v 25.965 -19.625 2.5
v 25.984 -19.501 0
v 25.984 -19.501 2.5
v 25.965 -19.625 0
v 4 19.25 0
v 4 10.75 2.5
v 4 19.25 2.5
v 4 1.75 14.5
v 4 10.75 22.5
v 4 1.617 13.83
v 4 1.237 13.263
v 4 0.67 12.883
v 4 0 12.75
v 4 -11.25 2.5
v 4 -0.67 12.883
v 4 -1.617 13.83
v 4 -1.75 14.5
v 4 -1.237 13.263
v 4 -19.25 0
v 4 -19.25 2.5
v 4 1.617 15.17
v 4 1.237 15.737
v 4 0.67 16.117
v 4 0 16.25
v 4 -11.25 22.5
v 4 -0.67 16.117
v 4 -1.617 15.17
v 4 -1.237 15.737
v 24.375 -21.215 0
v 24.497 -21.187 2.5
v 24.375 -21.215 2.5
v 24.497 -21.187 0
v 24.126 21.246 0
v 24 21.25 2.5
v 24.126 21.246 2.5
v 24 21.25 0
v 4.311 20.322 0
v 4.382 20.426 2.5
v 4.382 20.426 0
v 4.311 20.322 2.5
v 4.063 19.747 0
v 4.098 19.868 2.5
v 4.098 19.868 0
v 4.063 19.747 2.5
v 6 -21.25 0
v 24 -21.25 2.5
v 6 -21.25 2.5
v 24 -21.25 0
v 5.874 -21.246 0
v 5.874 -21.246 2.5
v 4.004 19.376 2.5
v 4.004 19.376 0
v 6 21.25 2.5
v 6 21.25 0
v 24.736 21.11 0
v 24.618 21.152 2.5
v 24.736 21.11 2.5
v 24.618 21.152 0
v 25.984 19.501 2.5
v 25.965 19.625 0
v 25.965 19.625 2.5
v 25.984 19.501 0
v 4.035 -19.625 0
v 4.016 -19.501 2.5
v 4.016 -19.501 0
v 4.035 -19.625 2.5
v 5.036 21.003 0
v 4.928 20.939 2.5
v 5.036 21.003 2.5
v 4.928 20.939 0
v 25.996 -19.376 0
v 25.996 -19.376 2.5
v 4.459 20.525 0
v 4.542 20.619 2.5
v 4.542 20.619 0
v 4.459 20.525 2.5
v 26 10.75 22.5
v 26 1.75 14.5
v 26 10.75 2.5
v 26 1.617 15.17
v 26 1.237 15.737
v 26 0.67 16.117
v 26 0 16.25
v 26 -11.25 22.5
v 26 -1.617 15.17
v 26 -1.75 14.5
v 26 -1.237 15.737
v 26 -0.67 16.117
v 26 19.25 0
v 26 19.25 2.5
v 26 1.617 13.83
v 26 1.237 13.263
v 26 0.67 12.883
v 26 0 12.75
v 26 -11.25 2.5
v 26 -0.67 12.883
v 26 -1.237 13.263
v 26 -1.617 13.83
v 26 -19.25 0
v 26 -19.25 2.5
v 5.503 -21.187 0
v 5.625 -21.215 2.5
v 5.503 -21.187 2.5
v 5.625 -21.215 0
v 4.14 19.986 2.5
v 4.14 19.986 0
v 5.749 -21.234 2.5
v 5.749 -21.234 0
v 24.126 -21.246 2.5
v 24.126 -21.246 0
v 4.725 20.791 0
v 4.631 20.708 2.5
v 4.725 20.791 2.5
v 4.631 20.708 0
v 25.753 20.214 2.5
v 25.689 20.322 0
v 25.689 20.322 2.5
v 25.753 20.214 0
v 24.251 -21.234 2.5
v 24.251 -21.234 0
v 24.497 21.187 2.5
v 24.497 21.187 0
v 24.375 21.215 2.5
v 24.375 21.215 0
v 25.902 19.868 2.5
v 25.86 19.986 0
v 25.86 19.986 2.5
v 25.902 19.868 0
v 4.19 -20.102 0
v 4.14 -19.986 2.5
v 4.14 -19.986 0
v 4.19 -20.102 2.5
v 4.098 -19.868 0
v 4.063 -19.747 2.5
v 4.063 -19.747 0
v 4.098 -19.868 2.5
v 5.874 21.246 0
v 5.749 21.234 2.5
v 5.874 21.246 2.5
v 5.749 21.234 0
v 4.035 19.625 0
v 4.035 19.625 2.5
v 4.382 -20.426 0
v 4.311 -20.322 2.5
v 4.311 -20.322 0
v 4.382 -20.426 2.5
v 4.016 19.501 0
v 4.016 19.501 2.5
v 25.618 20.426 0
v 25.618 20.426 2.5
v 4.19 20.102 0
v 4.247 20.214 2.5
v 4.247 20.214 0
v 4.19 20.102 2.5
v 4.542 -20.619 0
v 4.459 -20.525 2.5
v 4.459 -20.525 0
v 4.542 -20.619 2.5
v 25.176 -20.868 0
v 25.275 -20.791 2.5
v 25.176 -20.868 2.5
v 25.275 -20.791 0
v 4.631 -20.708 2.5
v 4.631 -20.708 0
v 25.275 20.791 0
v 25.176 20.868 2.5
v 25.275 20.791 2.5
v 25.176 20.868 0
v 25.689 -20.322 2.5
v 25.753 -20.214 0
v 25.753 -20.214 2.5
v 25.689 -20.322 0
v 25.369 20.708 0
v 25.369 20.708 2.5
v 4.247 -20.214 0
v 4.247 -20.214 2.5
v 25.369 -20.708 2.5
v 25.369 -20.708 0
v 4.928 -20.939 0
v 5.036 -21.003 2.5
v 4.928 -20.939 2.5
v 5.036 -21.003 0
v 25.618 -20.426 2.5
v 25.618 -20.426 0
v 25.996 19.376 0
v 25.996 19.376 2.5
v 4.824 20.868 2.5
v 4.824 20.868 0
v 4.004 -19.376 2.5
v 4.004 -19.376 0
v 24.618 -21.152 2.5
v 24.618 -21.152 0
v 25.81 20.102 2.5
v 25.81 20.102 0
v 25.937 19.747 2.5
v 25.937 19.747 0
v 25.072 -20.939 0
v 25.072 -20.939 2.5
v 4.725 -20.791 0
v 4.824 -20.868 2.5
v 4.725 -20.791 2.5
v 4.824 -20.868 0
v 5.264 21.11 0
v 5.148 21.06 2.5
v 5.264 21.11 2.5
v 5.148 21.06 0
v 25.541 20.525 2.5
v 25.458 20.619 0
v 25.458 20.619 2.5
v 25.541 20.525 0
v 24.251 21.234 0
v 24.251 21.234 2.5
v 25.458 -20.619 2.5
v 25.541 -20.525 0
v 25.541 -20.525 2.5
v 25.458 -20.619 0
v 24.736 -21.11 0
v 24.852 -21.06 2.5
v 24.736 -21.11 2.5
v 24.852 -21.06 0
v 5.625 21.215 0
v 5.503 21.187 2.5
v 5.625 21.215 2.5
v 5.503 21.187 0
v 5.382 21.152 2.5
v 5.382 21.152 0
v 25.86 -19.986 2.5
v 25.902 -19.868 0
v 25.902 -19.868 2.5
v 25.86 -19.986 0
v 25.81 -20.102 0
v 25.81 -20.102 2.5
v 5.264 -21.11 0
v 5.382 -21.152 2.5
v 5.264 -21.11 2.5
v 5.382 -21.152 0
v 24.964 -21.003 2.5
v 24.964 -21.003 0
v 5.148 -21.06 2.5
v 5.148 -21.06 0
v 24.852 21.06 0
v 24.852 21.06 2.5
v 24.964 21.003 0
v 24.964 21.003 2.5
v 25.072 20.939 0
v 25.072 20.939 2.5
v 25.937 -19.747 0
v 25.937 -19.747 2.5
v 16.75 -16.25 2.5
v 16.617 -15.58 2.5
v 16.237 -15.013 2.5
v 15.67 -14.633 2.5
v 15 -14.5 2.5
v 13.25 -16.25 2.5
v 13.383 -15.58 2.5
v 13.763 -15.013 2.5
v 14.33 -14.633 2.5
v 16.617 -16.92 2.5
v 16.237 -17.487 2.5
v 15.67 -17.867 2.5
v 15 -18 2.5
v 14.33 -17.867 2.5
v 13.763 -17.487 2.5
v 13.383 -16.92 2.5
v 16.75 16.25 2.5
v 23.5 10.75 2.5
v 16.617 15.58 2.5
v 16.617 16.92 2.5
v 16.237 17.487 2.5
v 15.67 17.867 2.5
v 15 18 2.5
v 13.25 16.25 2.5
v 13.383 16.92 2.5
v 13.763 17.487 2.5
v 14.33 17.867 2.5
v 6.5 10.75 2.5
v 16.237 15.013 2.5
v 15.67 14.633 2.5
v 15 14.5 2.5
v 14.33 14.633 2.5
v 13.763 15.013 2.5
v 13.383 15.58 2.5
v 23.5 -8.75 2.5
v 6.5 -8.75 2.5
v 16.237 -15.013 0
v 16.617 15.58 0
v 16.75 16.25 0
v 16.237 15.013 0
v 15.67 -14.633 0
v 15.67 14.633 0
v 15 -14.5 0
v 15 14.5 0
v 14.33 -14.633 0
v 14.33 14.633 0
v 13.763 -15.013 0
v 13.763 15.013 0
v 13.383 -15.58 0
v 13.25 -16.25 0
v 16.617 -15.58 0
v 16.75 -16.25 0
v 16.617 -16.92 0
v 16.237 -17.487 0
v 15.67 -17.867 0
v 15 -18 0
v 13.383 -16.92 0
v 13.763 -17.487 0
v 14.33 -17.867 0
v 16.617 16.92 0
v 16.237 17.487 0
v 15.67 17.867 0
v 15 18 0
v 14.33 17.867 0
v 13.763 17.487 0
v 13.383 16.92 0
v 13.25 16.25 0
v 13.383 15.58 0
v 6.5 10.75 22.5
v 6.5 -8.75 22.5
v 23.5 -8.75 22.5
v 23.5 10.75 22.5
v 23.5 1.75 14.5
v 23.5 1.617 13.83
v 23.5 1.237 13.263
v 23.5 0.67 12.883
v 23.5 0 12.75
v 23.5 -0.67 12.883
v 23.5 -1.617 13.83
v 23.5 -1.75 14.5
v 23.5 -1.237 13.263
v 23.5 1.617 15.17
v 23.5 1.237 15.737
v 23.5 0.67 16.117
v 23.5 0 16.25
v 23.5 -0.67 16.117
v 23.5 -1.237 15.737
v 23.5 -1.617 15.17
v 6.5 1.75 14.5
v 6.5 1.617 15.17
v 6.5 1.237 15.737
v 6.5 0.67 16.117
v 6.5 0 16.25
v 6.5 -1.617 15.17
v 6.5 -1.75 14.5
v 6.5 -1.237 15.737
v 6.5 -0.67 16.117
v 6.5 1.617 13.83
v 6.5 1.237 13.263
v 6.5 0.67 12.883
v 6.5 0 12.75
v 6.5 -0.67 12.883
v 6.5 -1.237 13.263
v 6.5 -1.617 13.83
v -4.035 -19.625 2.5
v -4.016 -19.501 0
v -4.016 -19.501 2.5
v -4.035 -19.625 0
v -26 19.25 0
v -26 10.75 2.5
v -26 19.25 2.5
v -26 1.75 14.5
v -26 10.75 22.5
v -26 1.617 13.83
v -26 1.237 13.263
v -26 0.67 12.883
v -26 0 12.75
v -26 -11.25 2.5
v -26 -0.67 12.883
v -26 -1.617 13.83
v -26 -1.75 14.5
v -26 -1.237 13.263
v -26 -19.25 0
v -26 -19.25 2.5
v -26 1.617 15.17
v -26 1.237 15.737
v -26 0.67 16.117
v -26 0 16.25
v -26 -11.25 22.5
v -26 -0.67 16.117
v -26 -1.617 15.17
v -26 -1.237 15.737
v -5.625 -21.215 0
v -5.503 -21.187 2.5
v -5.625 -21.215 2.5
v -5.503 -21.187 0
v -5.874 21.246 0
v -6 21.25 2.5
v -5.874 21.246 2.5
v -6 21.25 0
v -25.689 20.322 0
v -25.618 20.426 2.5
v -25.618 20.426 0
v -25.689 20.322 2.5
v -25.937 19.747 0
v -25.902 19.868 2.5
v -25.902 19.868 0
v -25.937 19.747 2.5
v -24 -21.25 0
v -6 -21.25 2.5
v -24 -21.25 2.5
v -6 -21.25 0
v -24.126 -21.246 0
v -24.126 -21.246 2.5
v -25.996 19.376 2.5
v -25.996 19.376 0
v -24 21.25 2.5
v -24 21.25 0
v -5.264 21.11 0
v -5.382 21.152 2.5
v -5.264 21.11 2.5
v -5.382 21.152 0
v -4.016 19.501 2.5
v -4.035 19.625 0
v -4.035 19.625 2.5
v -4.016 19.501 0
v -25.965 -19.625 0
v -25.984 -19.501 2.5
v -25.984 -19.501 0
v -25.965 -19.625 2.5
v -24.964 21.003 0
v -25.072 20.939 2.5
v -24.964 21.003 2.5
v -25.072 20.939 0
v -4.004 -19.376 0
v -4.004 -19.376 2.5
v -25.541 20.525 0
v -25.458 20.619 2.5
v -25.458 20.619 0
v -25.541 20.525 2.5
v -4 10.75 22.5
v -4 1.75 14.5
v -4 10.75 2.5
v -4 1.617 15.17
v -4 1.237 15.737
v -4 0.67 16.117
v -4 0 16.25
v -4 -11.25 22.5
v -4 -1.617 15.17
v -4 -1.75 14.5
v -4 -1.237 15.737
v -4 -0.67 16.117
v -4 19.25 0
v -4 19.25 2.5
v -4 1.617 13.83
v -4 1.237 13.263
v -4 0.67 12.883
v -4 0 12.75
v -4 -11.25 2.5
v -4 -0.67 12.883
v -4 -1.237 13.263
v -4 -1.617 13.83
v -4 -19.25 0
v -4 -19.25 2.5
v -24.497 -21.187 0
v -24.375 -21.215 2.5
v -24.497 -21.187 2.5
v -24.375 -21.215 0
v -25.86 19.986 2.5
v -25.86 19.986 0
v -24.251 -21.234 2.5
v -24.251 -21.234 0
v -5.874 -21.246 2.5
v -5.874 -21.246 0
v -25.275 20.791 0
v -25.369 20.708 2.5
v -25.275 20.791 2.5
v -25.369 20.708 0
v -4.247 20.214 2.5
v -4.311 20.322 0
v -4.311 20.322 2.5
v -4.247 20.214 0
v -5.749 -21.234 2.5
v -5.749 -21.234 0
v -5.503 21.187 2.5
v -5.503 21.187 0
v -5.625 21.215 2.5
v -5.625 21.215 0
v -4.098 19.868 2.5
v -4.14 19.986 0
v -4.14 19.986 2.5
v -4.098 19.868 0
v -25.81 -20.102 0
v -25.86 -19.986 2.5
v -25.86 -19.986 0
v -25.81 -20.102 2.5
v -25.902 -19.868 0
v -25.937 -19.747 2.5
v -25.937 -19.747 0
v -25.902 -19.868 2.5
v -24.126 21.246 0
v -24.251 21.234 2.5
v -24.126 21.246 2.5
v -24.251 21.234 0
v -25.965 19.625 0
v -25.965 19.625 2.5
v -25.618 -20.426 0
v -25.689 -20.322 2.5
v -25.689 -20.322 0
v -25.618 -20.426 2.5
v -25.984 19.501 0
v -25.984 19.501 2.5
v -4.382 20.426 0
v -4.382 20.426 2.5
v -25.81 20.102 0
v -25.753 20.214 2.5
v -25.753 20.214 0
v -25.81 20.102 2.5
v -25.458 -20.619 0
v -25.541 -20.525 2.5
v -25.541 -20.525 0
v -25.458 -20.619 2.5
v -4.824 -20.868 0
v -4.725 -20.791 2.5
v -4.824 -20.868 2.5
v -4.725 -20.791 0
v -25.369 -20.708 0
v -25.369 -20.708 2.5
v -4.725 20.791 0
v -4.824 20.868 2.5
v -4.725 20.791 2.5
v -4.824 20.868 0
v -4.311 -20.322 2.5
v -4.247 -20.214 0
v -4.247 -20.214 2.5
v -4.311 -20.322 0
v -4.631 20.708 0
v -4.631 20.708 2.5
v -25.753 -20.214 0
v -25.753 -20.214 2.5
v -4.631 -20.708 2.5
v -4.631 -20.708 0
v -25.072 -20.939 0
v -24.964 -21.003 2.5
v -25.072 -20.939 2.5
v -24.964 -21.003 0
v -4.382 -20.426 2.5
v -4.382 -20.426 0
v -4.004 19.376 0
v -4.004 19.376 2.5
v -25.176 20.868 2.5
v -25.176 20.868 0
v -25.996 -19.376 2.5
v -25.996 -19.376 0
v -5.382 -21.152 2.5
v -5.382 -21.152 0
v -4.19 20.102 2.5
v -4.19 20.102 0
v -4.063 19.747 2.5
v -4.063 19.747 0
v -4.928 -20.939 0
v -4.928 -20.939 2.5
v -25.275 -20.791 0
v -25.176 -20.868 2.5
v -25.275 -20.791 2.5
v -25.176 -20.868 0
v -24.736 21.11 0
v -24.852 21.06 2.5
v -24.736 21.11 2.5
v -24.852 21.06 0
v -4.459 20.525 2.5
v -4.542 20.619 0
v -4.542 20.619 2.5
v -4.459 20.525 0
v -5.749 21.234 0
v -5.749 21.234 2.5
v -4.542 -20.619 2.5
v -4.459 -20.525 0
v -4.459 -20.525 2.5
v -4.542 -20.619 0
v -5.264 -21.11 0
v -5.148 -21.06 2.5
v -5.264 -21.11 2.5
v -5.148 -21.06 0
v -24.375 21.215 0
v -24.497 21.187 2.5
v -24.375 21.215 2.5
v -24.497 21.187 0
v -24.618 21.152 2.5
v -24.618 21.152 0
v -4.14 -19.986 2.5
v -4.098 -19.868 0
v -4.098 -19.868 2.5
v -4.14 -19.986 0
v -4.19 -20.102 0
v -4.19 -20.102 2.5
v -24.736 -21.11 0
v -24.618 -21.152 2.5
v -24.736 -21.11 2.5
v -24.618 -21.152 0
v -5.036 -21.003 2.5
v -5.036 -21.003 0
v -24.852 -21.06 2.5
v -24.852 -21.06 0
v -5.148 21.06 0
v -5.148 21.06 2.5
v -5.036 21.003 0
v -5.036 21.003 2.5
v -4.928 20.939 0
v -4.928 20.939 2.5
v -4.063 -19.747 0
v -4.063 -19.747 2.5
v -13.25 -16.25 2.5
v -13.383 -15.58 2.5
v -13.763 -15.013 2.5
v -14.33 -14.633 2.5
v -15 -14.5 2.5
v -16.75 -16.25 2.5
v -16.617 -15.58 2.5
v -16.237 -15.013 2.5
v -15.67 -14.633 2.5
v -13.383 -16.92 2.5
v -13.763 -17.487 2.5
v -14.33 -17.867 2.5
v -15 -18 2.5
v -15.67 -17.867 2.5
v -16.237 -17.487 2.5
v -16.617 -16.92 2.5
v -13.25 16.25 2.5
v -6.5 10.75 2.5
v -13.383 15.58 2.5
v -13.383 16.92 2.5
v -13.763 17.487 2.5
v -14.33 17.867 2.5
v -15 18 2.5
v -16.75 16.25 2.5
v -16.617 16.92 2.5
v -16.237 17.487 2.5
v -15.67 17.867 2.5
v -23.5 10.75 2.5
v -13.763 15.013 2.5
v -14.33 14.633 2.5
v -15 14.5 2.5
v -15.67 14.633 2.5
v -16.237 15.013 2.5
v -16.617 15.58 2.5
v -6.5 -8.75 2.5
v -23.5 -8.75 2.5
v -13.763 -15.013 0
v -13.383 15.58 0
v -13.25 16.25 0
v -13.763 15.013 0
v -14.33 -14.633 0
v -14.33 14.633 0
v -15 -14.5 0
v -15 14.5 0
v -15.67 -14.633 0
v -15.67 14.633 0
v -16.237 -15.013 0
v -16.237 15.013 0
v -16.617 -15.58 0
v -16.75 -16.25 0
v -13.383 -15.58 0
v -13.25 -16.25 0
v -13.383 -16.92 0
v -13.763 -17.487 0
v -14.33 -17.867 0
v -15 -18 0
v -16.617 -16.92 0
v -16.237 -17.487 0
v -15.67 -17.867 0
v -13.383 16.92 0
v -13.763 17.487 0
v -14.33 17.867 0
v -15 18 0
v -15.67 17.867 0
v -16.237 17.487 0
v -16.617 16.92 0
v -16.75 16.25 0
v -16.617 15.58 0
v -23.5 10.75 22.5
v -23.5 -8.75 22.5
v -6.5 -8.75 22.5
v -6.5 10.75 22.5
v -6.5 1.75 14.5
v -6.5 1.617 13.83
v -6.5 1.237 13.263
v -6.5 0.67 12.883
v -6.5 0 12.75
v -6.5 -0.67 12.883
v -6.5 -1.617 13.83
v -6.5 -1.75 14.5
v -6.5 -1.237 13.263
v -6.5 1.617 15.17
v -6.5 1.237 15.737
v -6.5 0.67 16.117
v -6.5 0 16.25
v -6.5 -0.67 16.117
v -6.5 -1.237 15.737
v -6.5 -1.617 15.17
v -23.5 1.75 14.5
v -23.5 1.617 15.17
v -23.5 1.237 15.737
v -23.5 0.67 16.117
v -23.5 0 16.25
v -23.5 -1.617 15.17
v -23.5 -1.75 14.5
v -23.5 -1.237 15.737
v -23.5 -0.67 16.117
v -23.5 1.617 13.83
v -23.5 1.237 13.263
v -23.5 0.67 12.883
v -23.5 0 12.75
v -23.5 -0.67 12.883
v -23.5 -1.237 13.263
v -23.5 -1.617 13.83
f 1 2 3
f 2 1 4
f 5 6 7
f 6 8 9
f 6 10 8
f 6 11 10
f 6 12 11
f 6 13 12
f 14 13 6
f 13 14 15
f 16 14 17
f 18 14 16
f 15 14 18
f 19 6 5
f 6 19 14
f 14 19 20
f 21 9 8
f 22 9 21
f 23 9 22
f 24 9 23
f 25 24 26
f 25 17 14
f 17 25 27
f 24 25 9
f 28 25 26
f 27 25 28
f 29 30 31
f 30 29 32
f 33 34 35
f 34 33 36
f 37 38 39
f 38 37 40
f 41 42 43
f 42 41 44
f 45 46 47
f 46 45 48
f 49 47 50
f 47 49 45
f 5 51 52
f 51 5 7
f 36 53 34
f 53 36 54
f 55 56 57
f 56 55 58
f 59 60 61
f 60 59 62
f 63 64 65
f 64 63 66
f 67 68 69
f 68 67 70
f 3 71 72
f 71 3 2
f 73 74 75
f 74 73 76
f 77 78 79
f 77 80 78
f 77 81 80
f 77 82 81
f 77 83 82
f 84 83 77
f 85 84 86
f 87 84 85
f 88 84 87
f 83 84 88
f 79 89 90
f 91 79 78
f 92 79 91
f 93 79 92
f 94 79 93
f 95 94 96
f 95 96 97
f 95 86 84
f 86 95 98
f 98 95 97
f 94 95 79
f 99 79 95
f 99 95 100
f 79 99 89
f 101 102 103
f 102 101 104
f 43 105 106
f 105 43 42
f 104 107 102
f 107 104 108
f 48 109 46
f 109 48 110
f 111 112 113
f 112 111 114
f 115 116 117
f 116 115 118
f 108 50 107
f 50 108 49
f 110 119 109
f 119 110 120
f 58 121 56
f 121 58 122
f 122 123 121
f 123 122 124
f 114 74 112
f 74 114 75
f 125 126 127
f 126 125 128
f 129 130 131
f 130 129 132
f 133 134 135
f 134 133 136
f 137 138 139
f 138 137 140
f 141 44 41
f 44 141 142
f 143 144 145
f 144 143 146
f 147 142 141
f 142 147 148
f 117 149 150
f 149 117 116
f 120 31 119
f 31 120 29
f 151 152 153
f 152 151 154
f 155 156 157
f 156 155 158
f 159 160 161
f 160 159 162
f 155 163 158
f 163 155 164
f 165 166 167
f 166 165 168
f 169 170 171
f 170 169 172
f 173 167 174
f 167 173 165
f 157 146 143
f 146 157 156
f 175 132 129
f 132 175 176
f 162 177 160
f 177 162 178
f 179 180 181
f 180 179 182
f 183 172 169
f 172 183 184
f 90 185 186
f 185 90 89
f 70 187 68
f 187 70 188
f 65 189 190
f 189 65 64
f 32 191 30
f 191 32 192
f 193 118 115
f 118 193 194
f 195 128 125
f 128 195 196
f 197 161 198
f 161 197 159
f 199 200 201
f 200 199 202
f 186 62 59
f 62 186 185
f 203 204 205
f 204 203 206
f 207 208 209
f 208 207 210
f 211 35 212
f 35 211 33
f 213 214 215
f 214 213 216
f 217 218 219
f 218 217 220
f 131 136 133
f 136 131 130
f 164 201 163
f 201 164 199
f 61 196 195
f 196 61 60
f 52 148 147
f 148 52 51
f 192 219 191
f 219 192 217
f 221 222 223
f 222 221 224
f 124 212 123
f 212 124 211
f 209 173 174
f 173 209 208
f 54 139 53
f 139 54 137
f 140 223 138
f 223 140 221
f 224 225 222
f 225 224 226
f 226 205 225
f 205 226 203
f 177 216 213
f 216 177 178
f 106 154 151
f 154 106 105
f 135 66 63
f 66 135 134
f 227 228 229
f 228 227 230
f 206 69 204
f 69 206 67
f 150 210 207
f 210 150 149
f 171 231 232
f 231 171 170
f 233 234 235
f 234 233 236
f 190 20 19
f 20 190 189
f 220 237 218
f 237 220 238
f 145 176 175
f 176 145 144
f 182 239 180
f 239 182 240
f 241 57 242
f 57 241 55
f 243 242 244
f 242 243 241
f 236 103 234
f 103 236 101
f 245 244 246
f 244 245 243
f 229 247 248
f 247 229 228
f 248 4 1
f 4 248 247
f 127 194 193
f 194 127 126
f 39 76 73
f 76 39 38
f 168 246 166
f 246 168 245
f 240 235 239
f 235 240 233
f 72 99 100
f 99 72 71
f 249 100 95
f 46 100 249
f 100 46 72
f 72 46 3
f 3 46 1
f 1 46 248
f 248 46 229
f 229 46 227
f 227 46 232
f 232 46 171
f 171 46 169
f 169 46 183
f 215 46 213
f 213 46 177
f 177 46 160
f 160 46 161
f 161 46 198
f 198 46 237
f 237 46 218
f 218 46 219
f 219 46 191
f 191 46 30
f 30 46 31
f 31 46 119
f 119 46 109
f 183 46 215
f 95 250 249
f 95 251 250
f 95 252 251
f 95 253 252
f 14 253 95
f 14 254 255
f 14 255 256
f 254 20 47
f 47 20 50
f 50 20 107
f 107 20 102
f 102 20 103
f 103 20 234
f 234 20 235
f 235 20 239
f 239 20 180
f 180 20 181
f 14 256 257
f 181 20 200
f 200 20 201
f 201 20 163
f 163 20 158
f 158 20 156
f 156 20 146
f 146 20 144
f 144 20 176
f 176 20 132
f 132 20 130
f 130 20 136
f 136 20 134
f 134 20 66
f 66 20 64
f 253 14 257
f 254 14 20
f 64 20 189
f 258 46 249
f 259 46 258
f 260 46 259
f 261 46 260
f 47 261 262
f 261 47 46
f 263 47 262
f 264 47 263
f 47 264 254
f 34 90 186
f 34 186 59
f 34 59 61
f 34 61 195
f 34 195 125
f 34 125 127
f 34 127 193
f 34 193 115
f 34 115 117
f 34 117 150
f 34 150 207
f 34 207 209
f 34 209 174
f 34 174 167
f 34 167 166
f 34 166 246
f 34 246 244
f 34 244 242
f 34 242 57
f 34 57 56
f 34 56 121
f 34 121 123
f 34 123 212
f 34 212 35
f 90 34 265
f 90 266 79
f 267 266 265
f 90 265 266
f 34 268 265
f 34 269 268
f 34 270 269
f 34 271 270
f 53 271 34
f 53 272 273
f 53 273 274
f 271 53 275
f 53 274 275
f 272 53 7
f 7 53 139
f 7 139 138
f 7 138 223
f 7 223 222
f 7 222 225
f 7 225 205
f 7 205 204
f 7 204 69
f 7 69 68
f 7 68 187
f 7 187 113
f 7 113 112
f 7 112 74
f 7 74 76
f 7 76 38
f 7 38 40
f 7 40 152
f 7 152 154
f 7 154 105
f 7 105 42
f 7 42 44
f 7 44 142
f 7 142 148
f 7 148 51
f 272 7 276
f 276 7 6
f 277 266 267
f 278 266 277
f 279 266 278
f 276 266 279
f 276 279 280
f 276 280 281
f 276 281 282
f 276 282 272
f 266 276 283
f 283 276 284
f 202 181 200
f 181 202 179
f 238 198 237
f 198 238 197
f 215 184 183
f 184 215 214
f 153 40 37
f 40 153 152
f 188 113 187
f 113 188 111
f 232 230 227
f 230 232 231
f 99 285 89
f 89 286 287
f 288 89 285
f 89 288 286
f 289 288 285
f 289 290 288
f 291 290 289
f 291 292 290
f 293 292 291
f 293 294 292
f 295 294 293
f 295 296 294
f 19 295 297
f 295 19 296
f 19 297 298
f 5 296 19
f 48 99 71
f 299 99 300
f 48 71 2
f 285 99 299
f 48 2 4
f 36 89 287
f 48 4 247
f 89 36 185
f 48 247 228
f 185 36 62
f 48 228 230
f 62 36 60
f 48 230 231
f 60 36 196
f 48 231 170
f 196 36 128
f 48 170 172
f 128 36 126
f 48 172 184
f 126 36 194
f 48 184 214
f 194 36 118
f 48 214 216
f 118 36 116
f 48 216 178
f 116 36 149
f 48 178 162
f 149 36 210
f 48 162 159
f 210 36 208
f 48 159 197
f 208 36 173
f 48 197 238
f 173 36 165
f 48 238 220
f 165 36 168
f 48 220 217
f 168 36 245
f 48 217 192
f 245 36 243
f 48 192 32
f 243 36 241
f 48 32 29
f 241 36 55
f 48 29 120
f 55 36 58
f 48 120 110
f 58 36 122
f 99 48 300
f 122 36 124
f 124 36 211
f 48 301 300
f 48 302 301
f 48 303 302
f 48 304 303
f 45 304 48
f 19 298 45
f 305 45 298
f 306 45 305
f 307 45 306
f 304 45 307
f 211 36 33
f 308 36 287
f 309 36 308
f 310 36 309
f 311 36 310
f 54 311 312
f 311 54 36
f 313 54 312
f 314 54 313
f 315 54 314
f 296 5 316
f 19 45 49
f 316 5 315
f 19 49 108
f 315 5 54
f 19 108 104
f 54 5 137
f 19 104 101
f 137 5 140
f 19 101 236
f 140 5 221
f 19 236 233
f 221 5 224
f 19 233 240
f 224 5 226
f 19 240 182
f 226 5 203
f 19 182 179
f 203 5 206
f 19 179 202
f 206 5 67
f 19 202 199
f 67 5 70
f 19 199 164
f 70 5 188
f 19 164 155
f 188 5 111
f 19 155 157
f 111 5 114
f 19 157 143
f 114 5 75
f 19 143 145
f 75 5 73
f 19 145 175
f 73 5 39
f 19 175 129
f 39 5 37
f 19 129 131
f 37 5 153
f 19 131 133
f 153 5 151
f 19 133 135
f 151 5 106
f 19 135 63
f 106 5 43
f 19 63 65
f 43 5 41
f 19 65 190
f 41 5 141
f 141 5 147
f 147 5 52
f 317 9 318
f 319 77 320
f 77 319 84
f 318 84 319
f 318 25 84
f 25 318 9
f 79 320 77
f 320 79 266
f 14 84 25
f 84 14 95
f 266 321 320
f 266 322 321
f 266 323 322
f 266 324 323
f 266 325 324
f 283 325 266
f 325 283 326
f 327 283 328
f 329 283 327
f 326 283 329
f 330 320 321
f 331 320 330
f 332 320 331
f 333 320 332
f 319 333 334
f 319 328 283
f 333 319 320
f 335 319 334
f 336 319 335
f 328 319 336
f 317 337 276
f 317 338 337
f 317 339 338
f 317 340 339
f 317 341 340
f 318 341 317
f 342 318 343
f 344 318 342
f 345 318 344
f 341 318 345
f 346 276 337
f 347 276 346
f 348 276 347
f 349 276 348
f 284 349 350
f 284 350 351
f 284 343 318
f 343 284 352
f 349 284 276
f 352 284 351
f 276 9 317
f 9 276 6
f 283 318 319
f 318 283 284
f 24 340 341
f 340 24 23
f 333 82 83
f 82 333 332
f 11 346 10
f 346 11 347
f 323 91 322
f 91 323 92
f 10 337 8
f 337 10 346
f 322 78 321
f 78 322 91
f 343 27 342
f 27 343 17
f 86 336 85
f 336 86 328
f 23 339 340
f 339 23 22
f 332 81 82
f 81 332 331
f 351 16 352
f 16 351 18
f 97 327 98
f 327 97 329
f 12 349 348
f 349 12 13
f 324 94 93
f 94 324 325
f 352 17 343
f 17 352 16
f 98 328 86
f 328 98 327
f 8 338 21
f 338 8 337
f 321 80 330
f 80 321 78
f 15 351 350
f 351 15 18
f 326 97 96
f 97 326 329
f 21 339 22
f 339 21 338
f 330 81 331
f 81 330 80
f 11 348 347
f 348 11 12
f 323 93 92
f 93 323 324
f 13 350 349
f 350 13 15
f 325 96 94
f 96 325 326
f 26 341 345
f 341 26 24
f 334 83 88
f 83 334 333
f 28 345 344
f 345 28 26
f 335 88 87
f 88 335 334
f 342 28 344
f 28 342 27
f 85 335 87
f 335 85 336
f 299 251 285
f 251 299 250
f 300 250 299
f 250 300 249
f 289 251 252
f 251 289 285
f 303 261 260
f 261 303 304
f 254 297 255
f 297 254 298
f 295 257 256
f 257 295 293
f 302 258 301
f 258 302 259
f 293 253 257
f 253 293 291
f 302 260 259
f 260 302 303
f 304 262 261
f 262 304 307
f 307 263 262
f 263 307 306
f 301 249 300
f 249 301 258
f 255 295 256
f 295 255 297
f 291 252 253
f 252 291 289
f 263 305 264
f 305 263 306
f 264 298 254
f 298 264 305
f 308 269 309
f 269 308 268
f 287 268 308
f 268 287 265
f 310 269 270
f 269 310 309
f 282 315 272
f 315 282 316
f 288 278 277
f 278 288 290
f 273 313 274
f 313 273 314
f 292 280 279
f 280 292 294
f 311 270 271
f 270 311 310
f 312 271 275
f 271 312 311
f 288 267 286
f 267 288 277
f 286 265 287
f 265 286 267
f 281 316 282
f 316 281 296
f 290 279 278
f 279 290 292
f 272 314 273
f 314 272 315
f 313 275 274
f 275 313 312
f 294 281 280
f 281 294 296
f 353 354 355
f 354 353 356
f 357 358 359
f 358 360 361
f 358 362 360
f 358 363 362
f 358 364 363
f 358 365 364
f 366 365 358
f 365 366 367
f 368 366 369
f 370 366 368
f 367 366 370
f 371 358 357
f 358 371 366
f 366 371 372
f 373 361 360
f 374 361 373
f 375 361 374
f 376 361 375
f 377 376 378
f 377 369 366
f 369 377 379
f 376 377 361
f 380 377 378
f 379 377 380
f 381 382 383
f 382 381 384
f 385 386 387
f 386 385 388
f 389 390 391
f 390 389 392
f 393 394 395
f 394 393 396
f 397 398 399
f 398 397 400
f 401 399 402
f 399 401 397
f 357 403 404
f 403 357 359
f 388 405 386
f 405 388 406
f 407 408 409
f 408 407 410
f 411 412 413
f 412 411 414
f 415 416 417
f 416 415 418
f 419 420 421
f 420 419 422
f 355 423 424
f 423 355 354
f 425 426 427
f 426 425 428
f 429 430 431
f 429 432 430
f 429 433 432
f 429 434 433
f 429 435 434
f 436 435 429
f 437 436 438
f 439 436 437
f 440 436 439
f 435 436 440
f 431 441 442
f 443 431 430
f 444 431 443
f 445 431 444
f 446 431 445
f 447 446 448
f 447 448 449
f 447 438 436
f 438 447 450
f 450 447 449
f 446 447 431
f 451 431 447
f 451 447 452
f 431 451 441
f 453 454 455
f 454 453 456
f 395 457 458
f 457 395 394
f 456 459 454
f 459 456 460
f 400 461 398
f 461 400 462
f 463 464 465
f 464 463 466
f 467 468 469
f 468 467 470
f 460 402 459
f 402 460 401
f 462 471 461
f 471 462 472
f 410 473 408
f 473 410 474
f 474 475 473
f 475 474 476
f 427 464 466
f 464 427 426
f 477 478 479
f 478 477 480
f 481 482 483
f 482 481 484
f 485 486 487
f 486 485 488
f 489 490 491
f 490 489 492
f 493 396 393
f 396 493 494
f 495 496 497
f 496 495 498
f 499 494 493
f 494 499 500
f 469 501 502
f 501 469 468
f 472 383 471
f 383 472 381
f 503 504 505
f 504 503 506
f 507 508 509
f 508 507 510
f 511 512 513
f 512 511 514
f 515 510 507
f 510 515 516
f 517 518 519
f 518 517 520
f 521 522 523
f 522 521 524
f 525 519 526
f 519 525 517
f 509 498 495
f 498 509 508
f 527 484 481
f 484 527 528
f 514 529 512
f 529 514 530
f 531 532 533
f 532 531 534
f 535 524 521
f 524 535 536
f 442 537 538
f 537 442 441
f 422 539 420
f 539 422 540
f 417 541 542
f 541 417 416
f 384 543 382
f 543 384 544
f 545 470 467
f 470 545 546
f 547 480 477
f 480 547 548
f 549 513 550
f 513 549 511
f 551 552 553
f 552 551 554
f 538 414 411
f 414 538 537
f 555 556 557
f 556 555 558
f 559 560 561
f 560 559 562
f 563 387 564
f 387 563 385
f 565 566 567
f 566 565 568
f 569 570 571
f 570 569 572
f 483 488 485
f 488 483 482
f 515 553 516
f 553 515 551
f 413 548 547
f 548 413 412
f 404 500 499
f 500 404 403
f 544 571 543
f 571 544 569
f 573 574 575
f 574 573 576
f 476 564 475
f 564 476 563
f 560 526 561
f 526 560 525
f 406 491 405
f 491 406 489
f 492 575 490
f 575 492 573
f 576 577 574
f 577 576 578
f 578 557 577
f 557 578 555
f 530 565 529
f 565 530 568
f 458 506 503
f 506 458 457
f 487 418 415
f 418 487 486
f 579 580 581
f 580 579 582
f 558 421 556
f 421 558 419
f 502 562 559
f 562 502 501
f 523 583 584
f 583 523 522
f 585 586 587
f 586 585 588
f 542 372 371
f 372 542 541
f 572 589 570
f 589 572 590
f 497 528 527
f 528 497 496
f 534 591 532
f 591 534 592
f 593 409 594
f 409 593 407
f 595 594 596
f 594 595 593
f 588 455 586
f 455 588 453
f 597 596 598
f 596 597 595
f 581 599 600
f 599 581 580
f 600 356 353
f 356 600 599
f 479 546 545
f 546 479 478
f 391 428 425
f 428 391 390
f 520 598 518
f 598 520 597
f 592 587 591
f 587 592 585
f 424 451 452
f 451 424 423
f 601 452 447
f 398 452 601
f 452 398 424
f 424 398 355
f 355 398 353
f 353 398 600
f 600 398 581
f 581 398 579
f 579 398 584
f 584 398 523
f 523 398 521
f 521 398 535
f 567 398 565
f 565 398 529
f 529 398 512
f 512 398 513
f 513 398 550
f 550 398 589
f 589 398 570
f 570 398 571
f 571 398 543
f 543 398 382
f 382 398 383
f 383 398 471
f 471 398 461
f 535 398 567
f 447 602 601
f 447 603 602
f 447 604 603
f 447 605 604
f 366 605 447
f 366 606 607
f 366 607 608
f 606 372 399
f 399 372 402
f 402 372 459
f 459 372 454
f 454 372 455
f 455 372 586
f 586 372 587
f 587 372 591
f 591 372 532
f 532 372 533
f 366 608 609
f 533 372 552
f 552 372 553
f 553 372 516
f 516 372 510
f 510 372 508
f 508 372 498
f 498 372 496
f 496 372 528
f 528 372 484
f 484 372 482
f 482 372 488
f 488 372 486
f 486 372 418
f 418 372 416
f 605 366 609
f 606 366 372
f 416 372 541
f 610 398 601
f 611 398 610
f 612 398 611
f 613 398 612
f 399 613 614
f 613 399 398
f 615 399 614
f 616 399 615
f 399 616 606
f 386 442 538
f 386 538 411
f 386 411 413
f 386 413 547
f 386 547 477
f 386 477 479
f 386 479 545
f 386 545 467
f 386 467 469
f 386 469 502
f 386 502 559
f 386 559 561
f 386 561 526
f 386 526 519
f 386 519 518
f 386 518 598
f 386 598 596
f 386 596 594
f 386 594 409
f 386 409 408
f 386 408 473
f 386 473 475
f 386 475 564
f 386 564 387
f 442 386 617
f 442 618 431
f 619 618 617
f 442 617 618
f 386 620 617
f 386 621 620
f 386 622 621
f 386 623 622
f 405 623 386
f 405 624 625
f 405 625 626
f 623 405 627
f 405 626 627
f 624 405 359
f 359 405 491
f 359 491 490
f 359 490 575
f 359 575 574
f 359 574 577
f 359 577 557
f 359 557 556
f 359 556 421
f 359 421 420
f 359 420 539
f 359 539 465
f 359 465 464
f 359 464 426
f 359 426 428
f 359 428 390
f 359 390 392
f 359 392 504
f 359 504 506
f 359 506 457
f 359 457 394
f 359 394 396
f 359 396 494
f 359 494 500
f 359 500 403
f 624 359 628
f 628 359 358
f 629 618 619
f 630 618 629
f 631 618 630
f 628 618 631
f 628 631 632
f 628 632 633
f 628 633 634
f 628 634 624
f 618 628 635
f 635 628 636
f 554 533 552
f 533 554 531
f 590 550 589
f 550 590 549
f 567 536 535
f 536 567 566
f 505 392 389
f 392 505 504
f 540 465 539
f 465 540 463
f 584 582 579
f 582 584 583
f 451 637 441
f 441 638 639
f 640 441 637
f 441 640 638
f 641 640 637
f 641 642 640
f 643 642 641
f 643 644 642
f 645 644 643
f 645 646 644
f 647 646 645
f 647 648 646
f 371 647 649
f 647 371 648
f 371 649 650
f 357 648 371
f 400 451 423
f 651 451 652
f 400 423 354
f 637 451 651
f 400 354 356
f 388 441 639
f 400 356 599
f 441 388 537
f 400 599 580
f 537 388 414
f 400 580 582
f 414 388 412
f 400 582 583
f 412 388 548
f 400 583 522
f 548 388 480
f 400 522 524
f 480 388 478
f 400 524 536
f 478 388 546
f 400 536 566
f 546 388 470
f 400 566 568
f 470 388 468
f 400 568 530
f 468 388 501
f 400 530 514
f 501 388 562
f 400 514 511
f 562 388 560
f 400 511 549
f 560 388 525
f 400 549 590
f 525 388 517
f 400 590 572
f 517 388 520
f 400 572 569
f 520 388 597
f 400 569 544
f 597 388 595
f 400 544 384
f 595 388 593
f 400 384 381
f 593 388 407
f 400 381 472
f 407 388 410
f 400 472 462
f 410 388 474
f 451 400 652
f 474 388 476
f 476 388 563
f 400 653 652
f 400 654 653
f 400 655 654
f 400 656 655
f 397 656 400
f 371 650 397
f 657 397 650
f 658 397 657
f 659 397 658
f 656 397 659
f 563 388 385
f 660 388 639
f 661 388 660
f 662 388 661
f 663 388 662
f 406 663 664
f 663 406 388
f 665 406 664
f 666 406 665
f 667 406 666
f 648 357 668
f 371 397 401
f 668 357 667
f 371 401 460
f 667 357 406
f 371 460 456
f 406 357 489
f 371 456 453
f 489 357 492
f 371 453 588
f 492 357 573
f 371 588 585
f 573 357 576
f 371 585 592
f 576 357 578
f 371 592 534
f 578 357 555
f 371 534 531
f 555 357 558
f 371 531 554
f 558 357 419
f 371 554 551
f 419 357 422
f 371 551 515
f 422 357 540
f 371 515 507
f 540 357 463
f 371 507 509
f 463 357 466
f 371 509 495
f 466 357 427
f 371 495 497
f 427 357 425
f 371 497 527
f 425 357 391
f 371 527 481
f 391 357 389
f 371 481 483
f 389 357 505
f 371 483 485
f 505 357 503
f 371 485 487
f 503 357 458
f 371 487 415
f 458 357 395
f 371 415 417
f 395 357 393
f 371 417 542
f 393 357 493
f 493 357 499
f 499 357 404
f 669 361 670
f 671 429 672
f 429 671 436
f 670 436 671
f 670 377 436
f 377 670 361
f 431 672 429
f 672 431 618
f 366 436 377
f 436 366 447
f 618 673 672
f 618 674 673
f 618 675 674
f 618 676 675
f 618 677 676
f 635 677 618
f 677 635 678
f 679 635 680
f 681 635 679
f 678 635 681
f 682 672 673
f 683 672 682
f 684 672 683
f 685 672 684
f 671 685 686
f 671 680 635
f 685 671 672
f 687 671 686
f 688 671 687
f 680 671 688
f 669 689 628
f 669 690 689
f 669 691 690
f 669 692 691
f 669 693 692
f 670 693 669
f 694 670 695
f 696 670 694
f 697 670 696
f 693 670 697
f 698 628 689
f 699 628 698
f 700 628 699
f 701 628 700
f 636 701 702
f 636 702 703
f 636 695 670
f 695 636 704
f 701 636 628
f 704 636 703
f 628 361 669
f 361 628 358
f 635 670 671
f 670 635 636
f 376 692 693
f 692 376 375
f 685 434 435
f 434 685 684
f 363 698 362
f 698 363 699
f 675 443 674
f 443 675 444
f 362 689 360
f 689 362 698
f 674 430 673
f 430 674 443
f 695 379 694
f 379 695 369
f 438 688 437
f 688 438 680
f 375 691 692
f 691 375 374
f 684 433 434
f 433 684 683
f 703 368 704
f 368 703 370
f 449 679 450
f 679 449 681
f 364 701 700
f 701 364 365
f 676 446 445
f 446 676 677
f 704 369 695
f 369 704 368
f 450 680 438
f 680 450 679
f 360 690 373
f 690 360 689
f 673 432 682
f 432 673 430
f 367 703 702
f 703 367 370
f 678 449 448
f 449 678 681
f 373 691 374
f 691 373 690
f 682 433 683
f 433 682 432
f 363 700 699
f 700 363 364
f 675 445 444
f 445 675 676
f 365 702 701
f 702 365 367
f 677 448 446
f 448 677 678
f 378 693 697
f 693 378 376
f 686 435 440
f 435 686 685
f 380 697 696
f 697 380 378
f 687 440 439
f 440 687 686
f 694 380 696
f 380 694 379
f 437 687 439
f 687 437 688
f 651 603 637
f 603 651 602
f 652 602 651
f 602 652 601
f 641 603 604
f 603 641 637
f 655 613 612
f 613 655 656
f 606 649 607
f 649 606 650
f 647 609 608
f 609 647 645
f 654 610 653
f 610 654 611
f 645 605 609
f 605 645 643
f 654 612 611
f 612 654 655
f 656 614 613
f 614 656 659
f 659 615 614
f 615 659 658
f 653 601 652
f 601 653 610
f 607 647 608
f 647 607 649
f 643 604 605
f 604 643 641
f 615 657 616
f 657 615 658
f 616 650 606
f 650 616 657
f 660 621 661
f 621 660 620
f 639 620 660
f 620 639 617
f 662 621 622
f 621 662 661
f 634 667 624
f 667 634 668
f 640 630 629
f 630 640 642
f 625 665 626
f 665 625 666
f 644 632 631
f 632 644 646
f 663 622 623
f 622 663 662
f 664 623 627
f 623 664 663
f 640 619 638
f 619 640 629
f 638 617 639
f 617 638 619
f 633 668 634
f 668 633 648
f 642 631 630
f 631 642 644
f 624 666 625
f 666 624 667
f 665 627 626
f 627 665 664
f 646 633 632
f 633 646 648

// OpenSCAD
// file: config.scad
r4 = 2.2;
r8 = 4.2;
r10 = 5.2;

layer_height = 0.25;

switch_d = 9.6;

nema17_r_vis = 15.5;
nema17_r_centre = 11.5;
nema17_h_centre = 2;
nema17_h = 43;
nema17_l = 40;

boite_ui_largeur = 28.5;
boite_ui_l = 46;

support_laser = 24;

r3 = 1.75;
r3_2d = 1.5;
r3_vis = 1.65;
r3_head = 3.6;
m3_r = r3;
m3_nut_d = 7;
m3_nut_d2 = 6.2;
m3_nut_h = 3;

m4_nut_d = 8;
m4_nut_d2 = 7;
m4_nut_h = 4;

608_r = 23/2;
608_h = 8;

laser_printer_l = 609;
laser_printer_lg = 456;

module support_nut(d=3, l_screw1 = 20, l_screw2 = 20, l_nut = 20, h_screw2 = -0.1){
    if(d==3){
        screw_r = r3;
        nut_r = m3_nut_d/2;
        nut_h = m3_nut_h;
        cylinder(nut_h, r = nut_r, $fn = 6, center = true);
        translate([0, 0, -l_screw1])cylinder(l_screw1 +1, r = screw_r);
        translate([0, 0, m3_nut_h/2+ h_screw2])cylinder(l_screw2, r = screw_r);
        l = m3_nut_d*cos(30);
        translate([0, -l/2, -nut_h/2]) cube([l_nut, l,nut_h]);
    } else if(d==4){
        screw_r = r4;
        nut_r = m4_nut_d/2;
        nut_h = m4_nut_h;
        cylinder(nut_h, r = nut_r, $fn = 6, center = true);
        translate([0, 0, -l_screw1])cylinder(l_screw1 +1, r = screw_r);
        translate([0, 0, m4_nut_h/2+ h_screw2])cylinder(l_screw2, r = screw_r);
        l = m4_nut_d*cos(30);
        translate([0, -l/2, -nut_h/2]) cube([l_nut, l,nut_h]);
    }
}


module nut(d=3, center = false){
    nut_r = m3_nut_d/2;
    nut_h = m3_nut_h;
    if(d==3){
        nut_r = m3_nut_d/2;
        nut_h = m3_nut_h;
    } 
    cylinder(nut_h, r = nut_r, $fn = 6, center = center);
}



module m3(h, nut = false, head = false){
    cylinder(h, m3_r, m3_r, $fn=16);
    if(nut){
        cylinder(m3_nut_h, r = m3_nut_d/2, $fn = 6);
    }
}

module m3_nut(h){
    cylinder(m3_nut_h, r = m3_nut_d/2, $fn = 6);
    translate([0, -m3_nut_d2/2, 0]) cube([h, m3_nut_d2, m3_nut_h]);
}

m4_r = 2.3;
m4_nut_d = 8.4;
m4_nut_d2 = 7.5;
m4_nut_h = 3.5;
module m4(h, nut = false, head = false){
    cylinder(h, m4_r, m4_r);
    if(nut){
        cylinder(m4_nut_h, r = m4_nut_d/2, $fn = 6);
    }
}

module m5(h, nut = false, head = false){
    cylinder(h, r = 2.7);
}

m8_nut_d = 15;
m8_nut_d2 = 13;
m8_nut_h = 6.5;
module m8(h, nut = false, head = false){
    cylinder(h, r = r8);
    if(nut){
        cylinder(m8_nut_h, r = m8_nut_d/2, $fn = 6);
    }
}

module cube_arrondi(x, y, z, r=2){
    hull(){
        translate([(x/2-r), (y/2-r), 0]) cylinder(z,r=r);
        translate([(x/2-r), -(y/2-r), 0]) cylinder(z,r=r);
        translate([-(x/2-r), (y/2-r), 0]) cylinder(z,r=r);
        translate([-(x/2-r), -(y/2-r), 0]) cylinder(z,r=r);
    }
}

module demi_glissiere(r, l, h){
    cylinder(h, r, r);
    translate([-r, 0, 0]) cube([r*2, l, h]);
}


module nema17_2d(){
    nema17_l = 43;
    nema17_h = 6;
    polygon([[0,nema17_h], [nema17_h,0]
            , [nema17_l-nema17_h,0],[nema17_l,nema17_h]
            , [nema17_l,nema17_l-nema17_h],[nema17_l-nema17_h,nema17_l]
            , [8,nema17_l],[0,nema17_l-nema17_h] ]);
}

module nema17_2d2(){
    translate([nema17_r_vis, nema17_r_vis] ) circle(r3_2d);
    translate([nema17_r_vis, -nema17_r_vis] ) circle(r3_2d);
    translate([-nema17_r_vis, nema17_r_vis] ) circle(r3_2d);
    translate([-nema17_r_vis, -nema17_r_vis] ) circle(r3_2d);
    circle(nema17_r_centre);
}


module nema17(){
    translate([-nema17_h/2, -nema17_h/2, -nema17_l/2] ) linear_extrude(nema17_l) nema17_2d();
    
    h = nema17_h/2+6;
    translate([nema17_r_vis, nema17_r_vis, 0] )rotate([0, 0, 0]) cylinder(h, r = r3);
    translate([nema17_r_vis, -nema17_r_vis, 0] )rotate([0, 0, 0]) cylinder(h, r = r3);
    translate([-nema17_r_vis, nema17_r_vis, 0] )rotate([0, 0, 0]) cylinder(h, r = r3);
    translate([-nema17_r_vis, -nema17_r_vis, 0] )rotate([0, 0, 0]) cylinder(h, r = r3);
    cylinder(h, nema17_r_centre, nema17_r_centre);
    cylinder(h+14, r = 8);
    
    translate([-8.5, 0, -nema17_l/2] ) cube([17,30, 10]);
}

module corner(l_corner, h_corner, lg_corner){
    translate([0, lg_corner, 0]) rotate([90, 0, 0]) linear_extrude(lg_corner) polygon([[0,0], [l_corner, 0], [0, h_corner]]);
}


/**
 * 2D
 **/

module m3_2d(){
    circle(r3_2d);
}


module cran_x(_l, e, cran, inv){
    difference(){
        square([_l, e]);
        if(inv){
            for(i=[-round(_l/cran):round(_l/cran)]){
                translate([_l/2 + cran/2 - 2*i*cran, -1]) square([cran, e+2]);
            }
        }else{
            for(i=[-round(_l/cran):round(_l/cran)]){
                translate([_l/2 - cran/2 - 2*i*cran, -1]) square([cran, e+2]);
            }
        }
    }
}

module cran_y(_l, e, cran, inv){
    translate([e, 0]) rotate([0, 0, 90]) cran_x(_l, e, cran, inv); 
}

module whole_2d(type_vis){
    if(type_vis == 3){
        circle(1.5);
    } else if(type_vis == 4){
        circle(2);
    } else {
        echo("whole_2d " + type_vis);
    }
}

module nuts_2d(type_vis){
    if(type_vis == 3){
        translate([-1.5, 0])square([3, 20]);
        translate([-5.5/2, 10])square([5.5, 2.5]);
    } else if(type_vis == 4){
        translate([-2, 0])square([4, 30]);
        translate([-7/2, 20])square([7, 3.5]);
    } else {
        echo("nuts_2d " + type_vis);
    }
}

module cran_x_vis(_l, e, cran, type_vis = 3, trous = [0.1, 0.5, 0.9]){
    difference(){
        square([_l, e]);
        for(i=[-round(_l/cran):round(_l/cran)]){
                translate([_l/2 - cran/2 - 2*i*cran, -1]) square([cran, e+2]);
            }
        
    }
    for(i = trous){
        j = round((i-0.5)*_l/(2*cran));
        translate([_l/2  - 2*j*cran, e/2]) whole_2d(type_vis);
    }
}

module cran_x_nuts(_l, e, cran, type_vis = 3, trous = [0.1, 0.5, 0.9]){
    difference(){
        square([_l, e]);
        for(i=[-round(_l/cran):round(_l/cran)]){
                translate([_l/2 + cran/2 - 2*i*cran, -1]) square([cran, e+2]);
        }
    }
    for(i = trous){
        j = round((i-0.5)*_l/(2*cran));
        translate([_l/2  - 2*j*cran, e/2]) nuts_2d(type_vis);
    }
}

module cran_y_vis(_l, e, cran, type_vis = 3, trous = [0.1, 0.5, 0.9]){
    translate([e, 0]) rotate([0, 0, 90]) cran_x_vis(_l, e, cran, type_vis, trous);
}

module cran_y_nuts(_l, e, cran, type_vis = 3, trous = [0.1, 0.5, 0.9]){
    translate([0, _l]) rotate([0, 0, -90]) cran_x_nuts(_l, e, cran, type_vis, trous);
}
// main file
include <config.scad>;

$fn = 100;
e = 2.5;
l1=20+e;
l2 = l1 + 20;
h=17 + 2*e;
    
module corner_roulement(){
    difference(){
        union(){
            cube_arrondi(h, l2, e);
            mirror([1,0,0])translate([-h/2, -l1/2, 0]) cube([e, h, l1]);
            translate([-h/2, -l1/2, 0]) cube([e, h, l1]);
            translate([-h/2, -l1/2, 0]) cube([h, e, l1]);
        }
        translate([-15, 0, 12 +e]) rotate([0,90,0]) m3(30, center = true);
        
        translate([0, -(l2/2 -5),-1]) m3(10);
        translate([0, l2/2 -5,-1]) m3(10);
    }
}


translate([15,0,0]) corner_roulement();
translate([-15,0,0]) corner_roulement();
